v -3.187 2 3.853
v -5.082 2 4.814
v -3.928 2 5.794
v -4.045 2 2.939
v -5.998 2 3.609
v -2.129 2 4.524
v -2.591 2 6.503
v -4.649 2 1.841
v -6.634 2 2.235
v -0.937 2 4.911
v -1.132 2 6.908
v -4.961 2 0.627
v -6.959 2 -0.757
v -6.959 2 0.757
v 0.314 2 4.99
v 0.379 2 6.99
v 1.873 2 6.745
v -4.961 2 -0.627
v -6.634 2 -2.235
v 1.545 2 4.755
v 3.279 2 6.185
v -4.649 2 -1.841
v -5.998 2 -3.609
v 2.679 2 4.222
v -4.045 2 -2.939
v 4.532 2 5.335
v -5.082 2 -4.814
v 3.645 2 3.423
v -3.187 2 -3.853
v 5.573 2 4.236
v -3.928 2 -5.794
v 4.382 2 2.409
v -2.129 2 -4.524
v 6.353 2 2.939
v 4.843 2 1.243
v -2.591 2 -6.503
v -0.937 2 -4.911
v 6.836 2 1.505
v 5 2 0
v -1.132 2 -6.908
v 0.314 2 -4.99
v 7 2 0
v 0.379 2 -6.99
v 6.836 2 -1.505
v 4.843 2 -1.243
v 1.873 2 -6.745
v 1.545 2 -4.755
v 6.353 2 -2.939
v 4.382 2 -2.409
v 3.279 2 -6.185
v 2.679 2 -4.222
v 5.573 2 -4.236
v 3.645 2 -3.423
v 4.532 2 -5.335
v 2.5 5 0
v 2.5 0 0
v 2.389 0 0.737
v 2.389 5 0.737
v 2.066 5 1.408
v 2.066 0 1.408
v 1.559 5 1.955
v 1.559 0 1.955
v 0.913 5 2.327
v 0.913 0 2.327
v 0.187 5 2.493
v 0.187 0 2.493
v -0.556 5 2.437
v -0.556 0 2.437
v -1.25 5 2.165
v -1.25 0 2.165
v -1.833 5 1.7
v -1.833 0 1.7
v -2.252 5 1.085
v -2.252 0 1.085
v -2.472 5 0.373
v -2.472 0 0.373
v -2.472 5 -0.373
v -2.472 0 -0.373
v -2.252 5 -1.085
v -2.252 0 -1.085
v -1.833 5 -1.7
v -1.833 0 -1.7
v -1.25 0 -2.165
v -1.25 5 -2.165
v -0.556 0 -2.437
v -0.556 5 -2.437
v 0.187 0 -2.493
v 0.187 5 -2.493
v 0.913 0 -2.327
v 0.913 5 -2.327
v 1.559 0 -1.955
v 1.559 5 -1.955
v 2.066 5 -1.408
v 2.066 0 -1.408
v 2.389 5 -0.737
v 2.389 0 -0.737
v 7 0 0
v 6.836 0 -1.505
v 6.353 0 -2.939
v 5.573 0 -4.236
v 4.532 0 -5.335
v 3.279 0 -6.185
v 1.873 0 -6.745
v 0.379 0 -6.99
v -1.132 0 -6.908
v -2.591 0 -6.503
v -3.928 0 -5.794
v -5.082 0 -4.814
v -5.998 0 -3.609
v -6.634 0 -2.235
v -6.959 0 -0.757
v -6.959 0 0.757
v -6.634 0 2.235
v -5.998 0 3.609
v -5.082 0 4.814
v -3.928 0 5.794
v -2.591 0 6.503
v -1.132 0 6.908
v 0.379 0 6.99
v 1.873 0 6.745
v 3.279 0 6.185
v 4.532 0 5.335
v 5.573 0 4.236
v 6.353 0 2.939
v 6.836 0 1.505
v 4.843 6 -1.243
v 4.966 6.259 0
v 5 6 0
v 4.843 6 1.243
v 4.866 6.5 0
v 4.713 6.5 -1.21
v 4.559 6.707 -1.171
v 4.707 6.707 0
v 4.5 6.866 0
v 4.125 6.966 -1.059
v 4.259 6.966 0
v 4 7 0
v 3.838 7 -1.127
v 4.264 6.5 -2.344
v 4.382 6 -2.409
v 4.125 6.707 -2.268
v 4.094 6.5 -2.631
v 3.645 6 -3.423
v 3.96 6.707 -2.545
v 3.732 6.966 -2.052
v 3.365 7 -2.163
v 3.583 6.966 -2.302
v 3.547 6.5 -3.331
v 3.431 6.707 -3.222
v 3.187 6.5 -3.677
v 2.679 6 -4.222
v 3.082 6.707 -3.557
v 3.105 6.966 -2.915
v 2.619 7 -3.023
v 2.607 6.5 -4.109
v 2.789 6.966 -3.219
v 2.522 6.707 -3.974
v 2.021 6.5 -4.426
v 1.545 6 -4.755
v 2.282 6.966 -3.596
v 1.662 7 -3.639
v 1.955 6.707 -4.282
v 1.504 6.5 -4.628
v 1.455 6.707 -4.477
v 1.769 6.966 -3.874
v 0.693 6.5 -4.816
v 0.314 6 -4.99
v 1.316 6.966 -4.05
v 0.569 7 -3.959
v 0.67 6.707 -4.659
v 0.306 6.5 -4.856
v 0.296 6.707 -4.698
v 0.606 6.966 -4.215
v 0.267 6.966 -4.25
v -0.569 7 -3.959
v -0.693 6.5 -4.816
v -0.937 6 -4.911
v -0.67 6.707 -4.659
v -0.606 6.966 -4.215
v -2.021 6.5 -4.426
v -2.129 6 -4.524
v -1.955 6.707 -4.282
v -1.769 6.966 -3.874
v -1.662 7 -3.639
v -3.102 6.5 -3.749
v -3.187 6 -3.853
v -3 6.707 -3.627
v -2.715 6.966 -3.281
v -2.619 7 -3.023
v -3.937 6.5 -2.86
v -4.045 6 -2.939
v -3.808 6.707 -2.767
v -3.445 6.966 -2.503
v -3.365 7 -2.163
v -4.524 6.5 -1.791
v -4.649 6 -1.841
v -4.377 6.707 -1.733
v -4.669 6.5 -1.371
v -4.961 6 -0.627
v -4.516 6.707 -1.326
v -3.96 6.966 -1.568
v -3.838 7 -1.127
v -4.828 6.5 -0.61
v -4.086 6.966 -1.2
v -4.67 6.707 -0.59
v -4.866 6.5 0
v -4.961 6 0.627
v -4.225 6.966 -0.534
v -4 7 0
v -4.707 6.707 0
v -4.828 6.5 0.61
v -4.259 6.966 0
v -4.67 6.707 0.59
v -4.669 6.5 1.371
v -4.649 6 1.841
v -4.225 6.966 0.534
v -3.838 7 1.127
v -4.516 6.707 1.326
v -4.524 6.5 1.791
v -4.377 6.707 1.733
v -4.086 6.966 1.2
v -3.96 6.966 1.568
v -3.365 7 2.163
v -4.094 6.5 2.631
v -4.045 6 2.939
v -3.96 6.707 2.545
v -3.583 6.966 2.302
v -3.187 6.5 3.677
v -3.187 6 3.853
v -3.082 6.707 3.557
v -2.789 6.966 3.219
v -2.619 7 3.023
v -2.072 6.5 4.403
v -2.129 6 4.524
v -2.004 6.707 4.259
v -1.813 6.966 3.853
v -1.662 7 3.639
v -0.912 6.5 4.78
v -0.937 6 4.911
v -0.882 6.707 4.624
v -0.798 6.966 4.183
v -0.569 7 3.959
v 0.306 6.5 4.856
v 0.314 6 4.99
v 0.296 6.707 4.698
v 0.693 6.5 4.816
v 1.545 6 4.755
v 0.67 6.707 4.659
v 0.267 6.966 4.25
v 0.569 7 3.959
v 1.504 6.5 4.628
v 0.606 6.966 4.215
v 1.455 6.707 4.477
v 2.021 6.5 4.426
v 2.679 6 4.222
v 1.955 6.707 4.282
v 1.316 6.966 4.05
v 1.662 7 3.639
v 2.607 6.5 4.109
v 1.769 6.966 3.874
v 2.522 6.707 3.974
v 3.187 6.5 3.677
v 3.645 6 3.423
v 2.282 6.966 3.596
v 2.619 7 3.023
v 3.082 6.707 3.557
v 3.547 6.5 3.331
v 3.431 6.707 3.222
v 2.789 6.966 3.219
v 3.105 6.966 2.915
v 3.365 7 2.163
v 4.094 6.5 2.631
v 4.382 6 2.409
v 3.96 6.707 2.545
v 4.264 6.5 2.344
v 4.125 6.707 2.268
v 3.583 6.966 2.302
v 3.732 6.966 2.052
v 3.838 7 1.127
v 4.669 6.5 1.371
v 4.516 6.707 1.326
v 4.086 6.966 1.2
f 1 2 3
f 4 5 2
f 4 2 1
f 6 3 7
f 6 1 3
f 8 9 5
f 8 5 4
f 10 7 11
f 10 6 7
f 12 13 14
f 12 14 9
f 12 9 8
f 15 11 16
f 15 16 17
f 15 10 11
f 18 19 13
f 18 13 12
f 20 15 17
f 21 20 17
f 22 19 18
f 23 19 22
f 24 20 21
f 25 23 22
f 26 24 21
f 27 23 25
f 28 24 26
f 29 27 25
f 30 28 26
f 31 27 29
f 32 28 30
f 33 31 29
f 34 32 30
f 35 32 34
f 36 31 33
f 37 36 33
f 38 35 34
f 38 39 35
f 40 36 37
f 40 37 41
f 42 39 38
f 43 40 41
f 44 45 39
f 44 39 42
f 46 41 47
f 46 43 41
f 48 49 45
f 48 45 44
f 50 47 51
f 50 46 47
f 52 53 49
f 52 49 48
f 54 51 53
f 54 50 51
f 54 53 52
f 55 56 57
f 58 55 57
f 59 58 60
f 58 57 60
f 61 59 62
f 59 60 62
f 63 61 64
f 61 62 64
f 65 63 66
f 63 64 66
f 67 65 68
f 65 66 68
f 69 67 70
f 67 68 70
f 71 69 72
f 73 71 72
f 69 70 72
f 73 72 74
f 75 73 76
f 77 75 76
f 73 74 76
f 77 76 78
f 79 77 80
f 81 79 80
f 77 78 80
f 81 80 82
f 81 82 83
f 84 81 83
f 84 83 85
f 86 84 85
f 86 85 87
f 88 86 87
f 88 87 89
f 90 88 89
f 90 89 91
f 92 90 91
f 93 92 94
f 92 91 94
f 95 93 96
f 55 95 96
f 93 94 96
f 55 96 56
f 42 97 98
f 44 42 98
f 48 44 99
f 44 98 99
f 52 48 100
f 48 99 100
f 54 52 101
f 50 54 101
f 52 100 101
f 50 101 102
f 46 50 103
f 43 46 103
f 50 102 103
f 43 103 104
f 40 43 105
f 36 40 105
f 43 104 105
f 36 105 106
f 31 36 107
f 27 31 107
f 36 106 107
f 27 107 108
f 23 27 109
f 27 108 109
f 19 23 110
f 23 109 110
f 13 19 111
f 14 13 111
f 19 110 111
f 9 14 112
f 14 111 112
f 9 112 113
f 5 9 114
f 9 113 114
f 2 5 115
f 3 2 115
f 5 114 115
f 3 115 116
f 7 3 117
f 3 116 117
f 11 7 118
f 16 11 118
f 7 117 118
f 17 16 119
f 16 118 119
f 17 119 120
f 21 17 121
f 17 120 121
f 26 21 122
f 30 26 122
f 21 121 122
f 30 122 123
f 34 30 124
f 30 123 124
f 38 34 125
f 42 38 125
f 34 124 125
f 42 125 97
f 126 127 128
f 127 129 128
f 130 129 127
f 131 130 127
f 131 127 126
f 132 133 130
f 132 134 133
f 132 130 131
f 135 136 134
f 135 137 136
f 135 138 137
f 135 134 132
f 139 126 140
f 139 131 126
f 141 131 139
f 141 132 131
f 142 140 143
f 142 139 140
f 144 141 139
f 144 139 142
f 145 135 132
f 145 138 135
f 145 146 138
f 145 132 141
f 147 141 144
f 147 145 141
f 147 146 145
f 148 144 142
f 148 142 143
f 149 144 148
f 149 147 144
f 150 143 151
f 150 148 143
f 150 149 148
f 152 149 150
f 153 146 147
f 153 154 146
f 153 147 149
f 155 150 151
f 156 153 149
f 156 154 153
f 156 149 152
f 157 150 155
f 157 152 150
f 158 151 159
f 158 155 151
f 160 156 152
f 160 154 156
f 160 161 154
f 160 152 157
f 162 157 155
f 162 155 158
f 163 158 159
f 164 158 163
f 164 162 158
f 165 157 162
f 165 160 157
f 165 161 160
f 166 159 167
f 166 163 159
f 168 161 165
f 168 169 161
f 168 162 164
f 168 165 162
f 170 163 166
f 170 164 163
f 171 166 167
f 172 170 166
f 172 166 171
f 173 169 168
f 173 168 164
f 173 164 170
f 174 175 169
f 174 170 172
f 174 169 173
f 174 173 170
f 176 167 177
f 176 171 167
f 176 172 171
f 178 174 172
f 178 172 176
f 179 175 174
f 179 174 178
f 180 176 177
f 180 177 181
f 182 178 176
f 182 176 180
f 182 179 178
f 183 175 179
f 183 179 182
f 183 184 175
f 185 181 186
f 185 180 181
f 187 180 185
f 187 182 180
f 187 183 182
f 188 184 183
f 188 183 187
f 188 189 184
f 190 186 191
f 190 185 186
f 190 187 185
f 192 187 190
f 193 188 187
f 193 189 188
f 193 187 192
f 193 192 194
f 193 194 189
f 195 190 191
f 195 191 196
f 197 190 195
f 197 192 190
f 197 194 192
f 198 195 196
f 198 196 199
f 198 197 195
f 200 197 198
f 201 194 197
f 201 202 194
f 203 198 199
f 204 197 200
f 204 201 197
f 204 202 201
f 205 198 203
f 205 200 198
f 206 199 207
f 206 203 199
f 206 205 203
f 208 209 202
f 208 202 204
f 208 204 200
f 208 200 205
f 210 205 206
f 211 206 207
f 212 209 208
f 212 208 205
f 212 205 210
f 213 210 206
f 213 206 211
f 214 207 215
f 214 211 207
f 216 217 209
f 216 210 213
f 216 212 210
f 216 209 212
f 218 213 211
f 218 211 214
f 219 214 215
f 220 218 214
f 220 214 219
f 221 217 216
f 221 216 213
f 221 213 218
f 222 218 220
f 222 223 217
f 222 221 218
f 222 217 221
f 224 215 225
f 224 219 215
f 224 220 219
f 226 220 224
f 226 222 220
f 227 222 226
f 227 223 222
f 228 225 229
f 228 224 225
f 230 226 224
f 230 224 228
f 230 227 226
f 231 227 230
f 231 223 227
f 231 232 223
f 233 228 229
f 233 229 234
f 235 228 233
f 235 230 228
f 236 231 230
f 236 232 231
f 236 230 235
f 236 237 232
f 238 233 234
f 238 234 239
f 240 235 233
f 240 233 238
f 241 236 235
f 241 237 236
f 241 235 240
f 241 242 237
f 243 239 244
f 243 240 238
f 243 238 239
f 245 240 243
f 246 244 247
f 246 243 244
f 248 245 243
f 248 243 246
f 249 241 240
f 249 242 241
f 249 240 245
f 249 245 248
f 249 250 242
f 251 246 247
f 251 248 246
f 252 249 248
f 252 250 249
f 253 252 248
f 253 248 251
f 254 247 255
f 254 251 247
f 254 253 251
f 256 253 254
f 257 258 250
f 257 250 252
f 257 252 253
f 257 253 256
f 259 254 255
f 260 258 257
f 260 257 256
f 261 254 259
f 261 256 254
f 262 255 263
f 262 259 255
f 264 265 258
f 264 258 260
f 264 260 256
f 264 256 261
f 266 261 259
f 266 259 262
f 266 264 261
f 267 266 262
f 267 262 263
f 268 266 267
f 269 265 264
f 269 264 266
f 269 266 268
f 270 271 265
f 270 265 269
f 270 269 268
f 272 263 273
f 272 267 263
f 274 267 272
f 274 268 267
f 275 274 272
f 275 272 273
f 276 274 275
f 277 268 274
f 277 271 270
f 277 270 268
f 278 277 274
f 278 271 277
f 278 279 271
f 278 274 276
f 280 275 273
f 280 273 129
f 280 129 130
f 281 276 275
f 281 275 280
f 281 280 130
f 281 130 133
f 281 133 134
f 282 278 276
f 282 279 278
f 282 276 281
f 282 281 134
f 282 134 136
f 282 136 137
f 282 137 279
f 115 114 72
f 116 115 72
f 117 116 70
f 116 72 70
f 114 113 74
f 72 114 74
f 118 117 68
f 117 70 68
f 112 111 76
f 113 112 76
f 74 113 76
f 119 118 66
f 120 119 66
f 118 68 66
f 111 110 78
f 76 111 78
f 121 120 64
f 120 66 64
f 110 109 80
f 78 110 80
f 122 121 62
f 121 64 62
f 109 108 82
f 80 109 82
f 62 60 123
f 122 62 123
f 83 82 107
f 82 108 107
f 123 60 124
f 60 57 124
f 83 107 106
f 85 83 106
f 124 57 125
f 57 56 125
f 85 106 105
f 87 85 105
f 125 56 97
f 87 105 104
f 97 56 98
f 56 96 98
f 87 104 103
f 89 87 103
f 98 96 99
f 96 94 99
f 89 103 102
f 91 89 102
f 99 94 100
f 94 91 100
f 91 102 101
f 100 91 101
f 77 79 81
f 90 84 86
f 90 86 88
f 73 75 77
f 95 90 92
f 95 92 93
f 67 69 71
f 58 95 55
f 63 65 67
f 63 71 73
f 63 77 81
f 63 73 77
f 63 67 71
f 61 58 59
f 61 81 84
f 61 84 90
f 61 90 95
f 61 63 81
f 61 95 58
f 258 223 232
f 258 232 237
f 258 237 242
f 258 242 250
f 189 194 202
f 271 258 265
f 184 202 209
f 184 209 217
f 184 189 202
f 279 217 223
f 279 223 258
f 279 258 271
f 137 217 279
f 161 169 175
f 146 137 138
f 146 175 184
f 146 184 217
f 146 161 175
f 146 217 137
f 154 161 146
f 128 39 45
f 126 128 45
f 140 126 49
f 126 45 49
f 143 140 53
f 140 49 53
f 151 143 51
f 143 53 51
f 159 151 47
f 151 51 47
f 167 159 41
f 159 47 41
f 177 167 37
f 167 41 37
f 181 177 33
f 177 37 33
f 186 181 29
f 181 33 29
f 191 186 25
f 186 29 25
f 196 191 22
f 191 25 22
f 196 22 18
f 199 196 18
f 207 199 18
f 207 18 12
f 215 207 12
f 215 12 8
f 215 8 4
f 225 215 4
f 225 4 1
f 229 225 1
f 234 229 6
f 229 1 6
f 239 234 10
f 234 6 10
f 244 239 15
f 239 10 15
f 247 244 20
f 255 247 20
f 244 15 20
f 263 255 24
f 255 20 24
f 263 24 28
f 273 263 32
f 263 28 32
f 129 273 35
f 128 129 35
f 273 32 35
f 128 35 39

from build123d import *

# Parameters (mm, degrees)
SKETCH_1_R          = 7
EXTRUDE_1_DEPTH     = 2
SKETCH_2_R          = 5
EXTRUDE_2_DEPTH     = 5
SKETCH_3_R          = 2.5
CUT_EXTRUDE_1_DEPTH = 5
FILLET_1_R          = 1


with BuildPart() as part:
    # 草图1 → 凸台-拉伸1 (new body)
    with BuildSketch(Plane(origin=(0, 0, 0), x_dir=(1, 0, 0), z_dir=(0, 1, 0))):
        Circle(SKETCH_1_R)
    extrude(amount=EXTRUDE_1_DEPTH)

    # 草图2 → 凸台-拉伸2 (add)
    with BuildSketch(Plane(origin=(0, 2, 0), x_dir=(1, 0, 0), z_dir=(0, 1, 0))):
        Circle(SKETCH_2_R)
    extrude(amount=EXTRUDE_2_DEPTH)

    # 草图3 → 切除-拉伸1 (cut)
    with BuildSketch(Plane.XZ):
        Circle(SKETCH_3_R)
    extrude(amount=-CUT_EXTRUDE_1_DEPTH, mode=Mode.SUBTRACT)

    # 圆角1
    fillet_1_edges = [part.edges().sort_by_distance(p)[0] for p in [
        (-5, 7, 0),
    ]]
    fillet(fillet_1_edges, radius=FILLET_1_R)


solid = part.part
